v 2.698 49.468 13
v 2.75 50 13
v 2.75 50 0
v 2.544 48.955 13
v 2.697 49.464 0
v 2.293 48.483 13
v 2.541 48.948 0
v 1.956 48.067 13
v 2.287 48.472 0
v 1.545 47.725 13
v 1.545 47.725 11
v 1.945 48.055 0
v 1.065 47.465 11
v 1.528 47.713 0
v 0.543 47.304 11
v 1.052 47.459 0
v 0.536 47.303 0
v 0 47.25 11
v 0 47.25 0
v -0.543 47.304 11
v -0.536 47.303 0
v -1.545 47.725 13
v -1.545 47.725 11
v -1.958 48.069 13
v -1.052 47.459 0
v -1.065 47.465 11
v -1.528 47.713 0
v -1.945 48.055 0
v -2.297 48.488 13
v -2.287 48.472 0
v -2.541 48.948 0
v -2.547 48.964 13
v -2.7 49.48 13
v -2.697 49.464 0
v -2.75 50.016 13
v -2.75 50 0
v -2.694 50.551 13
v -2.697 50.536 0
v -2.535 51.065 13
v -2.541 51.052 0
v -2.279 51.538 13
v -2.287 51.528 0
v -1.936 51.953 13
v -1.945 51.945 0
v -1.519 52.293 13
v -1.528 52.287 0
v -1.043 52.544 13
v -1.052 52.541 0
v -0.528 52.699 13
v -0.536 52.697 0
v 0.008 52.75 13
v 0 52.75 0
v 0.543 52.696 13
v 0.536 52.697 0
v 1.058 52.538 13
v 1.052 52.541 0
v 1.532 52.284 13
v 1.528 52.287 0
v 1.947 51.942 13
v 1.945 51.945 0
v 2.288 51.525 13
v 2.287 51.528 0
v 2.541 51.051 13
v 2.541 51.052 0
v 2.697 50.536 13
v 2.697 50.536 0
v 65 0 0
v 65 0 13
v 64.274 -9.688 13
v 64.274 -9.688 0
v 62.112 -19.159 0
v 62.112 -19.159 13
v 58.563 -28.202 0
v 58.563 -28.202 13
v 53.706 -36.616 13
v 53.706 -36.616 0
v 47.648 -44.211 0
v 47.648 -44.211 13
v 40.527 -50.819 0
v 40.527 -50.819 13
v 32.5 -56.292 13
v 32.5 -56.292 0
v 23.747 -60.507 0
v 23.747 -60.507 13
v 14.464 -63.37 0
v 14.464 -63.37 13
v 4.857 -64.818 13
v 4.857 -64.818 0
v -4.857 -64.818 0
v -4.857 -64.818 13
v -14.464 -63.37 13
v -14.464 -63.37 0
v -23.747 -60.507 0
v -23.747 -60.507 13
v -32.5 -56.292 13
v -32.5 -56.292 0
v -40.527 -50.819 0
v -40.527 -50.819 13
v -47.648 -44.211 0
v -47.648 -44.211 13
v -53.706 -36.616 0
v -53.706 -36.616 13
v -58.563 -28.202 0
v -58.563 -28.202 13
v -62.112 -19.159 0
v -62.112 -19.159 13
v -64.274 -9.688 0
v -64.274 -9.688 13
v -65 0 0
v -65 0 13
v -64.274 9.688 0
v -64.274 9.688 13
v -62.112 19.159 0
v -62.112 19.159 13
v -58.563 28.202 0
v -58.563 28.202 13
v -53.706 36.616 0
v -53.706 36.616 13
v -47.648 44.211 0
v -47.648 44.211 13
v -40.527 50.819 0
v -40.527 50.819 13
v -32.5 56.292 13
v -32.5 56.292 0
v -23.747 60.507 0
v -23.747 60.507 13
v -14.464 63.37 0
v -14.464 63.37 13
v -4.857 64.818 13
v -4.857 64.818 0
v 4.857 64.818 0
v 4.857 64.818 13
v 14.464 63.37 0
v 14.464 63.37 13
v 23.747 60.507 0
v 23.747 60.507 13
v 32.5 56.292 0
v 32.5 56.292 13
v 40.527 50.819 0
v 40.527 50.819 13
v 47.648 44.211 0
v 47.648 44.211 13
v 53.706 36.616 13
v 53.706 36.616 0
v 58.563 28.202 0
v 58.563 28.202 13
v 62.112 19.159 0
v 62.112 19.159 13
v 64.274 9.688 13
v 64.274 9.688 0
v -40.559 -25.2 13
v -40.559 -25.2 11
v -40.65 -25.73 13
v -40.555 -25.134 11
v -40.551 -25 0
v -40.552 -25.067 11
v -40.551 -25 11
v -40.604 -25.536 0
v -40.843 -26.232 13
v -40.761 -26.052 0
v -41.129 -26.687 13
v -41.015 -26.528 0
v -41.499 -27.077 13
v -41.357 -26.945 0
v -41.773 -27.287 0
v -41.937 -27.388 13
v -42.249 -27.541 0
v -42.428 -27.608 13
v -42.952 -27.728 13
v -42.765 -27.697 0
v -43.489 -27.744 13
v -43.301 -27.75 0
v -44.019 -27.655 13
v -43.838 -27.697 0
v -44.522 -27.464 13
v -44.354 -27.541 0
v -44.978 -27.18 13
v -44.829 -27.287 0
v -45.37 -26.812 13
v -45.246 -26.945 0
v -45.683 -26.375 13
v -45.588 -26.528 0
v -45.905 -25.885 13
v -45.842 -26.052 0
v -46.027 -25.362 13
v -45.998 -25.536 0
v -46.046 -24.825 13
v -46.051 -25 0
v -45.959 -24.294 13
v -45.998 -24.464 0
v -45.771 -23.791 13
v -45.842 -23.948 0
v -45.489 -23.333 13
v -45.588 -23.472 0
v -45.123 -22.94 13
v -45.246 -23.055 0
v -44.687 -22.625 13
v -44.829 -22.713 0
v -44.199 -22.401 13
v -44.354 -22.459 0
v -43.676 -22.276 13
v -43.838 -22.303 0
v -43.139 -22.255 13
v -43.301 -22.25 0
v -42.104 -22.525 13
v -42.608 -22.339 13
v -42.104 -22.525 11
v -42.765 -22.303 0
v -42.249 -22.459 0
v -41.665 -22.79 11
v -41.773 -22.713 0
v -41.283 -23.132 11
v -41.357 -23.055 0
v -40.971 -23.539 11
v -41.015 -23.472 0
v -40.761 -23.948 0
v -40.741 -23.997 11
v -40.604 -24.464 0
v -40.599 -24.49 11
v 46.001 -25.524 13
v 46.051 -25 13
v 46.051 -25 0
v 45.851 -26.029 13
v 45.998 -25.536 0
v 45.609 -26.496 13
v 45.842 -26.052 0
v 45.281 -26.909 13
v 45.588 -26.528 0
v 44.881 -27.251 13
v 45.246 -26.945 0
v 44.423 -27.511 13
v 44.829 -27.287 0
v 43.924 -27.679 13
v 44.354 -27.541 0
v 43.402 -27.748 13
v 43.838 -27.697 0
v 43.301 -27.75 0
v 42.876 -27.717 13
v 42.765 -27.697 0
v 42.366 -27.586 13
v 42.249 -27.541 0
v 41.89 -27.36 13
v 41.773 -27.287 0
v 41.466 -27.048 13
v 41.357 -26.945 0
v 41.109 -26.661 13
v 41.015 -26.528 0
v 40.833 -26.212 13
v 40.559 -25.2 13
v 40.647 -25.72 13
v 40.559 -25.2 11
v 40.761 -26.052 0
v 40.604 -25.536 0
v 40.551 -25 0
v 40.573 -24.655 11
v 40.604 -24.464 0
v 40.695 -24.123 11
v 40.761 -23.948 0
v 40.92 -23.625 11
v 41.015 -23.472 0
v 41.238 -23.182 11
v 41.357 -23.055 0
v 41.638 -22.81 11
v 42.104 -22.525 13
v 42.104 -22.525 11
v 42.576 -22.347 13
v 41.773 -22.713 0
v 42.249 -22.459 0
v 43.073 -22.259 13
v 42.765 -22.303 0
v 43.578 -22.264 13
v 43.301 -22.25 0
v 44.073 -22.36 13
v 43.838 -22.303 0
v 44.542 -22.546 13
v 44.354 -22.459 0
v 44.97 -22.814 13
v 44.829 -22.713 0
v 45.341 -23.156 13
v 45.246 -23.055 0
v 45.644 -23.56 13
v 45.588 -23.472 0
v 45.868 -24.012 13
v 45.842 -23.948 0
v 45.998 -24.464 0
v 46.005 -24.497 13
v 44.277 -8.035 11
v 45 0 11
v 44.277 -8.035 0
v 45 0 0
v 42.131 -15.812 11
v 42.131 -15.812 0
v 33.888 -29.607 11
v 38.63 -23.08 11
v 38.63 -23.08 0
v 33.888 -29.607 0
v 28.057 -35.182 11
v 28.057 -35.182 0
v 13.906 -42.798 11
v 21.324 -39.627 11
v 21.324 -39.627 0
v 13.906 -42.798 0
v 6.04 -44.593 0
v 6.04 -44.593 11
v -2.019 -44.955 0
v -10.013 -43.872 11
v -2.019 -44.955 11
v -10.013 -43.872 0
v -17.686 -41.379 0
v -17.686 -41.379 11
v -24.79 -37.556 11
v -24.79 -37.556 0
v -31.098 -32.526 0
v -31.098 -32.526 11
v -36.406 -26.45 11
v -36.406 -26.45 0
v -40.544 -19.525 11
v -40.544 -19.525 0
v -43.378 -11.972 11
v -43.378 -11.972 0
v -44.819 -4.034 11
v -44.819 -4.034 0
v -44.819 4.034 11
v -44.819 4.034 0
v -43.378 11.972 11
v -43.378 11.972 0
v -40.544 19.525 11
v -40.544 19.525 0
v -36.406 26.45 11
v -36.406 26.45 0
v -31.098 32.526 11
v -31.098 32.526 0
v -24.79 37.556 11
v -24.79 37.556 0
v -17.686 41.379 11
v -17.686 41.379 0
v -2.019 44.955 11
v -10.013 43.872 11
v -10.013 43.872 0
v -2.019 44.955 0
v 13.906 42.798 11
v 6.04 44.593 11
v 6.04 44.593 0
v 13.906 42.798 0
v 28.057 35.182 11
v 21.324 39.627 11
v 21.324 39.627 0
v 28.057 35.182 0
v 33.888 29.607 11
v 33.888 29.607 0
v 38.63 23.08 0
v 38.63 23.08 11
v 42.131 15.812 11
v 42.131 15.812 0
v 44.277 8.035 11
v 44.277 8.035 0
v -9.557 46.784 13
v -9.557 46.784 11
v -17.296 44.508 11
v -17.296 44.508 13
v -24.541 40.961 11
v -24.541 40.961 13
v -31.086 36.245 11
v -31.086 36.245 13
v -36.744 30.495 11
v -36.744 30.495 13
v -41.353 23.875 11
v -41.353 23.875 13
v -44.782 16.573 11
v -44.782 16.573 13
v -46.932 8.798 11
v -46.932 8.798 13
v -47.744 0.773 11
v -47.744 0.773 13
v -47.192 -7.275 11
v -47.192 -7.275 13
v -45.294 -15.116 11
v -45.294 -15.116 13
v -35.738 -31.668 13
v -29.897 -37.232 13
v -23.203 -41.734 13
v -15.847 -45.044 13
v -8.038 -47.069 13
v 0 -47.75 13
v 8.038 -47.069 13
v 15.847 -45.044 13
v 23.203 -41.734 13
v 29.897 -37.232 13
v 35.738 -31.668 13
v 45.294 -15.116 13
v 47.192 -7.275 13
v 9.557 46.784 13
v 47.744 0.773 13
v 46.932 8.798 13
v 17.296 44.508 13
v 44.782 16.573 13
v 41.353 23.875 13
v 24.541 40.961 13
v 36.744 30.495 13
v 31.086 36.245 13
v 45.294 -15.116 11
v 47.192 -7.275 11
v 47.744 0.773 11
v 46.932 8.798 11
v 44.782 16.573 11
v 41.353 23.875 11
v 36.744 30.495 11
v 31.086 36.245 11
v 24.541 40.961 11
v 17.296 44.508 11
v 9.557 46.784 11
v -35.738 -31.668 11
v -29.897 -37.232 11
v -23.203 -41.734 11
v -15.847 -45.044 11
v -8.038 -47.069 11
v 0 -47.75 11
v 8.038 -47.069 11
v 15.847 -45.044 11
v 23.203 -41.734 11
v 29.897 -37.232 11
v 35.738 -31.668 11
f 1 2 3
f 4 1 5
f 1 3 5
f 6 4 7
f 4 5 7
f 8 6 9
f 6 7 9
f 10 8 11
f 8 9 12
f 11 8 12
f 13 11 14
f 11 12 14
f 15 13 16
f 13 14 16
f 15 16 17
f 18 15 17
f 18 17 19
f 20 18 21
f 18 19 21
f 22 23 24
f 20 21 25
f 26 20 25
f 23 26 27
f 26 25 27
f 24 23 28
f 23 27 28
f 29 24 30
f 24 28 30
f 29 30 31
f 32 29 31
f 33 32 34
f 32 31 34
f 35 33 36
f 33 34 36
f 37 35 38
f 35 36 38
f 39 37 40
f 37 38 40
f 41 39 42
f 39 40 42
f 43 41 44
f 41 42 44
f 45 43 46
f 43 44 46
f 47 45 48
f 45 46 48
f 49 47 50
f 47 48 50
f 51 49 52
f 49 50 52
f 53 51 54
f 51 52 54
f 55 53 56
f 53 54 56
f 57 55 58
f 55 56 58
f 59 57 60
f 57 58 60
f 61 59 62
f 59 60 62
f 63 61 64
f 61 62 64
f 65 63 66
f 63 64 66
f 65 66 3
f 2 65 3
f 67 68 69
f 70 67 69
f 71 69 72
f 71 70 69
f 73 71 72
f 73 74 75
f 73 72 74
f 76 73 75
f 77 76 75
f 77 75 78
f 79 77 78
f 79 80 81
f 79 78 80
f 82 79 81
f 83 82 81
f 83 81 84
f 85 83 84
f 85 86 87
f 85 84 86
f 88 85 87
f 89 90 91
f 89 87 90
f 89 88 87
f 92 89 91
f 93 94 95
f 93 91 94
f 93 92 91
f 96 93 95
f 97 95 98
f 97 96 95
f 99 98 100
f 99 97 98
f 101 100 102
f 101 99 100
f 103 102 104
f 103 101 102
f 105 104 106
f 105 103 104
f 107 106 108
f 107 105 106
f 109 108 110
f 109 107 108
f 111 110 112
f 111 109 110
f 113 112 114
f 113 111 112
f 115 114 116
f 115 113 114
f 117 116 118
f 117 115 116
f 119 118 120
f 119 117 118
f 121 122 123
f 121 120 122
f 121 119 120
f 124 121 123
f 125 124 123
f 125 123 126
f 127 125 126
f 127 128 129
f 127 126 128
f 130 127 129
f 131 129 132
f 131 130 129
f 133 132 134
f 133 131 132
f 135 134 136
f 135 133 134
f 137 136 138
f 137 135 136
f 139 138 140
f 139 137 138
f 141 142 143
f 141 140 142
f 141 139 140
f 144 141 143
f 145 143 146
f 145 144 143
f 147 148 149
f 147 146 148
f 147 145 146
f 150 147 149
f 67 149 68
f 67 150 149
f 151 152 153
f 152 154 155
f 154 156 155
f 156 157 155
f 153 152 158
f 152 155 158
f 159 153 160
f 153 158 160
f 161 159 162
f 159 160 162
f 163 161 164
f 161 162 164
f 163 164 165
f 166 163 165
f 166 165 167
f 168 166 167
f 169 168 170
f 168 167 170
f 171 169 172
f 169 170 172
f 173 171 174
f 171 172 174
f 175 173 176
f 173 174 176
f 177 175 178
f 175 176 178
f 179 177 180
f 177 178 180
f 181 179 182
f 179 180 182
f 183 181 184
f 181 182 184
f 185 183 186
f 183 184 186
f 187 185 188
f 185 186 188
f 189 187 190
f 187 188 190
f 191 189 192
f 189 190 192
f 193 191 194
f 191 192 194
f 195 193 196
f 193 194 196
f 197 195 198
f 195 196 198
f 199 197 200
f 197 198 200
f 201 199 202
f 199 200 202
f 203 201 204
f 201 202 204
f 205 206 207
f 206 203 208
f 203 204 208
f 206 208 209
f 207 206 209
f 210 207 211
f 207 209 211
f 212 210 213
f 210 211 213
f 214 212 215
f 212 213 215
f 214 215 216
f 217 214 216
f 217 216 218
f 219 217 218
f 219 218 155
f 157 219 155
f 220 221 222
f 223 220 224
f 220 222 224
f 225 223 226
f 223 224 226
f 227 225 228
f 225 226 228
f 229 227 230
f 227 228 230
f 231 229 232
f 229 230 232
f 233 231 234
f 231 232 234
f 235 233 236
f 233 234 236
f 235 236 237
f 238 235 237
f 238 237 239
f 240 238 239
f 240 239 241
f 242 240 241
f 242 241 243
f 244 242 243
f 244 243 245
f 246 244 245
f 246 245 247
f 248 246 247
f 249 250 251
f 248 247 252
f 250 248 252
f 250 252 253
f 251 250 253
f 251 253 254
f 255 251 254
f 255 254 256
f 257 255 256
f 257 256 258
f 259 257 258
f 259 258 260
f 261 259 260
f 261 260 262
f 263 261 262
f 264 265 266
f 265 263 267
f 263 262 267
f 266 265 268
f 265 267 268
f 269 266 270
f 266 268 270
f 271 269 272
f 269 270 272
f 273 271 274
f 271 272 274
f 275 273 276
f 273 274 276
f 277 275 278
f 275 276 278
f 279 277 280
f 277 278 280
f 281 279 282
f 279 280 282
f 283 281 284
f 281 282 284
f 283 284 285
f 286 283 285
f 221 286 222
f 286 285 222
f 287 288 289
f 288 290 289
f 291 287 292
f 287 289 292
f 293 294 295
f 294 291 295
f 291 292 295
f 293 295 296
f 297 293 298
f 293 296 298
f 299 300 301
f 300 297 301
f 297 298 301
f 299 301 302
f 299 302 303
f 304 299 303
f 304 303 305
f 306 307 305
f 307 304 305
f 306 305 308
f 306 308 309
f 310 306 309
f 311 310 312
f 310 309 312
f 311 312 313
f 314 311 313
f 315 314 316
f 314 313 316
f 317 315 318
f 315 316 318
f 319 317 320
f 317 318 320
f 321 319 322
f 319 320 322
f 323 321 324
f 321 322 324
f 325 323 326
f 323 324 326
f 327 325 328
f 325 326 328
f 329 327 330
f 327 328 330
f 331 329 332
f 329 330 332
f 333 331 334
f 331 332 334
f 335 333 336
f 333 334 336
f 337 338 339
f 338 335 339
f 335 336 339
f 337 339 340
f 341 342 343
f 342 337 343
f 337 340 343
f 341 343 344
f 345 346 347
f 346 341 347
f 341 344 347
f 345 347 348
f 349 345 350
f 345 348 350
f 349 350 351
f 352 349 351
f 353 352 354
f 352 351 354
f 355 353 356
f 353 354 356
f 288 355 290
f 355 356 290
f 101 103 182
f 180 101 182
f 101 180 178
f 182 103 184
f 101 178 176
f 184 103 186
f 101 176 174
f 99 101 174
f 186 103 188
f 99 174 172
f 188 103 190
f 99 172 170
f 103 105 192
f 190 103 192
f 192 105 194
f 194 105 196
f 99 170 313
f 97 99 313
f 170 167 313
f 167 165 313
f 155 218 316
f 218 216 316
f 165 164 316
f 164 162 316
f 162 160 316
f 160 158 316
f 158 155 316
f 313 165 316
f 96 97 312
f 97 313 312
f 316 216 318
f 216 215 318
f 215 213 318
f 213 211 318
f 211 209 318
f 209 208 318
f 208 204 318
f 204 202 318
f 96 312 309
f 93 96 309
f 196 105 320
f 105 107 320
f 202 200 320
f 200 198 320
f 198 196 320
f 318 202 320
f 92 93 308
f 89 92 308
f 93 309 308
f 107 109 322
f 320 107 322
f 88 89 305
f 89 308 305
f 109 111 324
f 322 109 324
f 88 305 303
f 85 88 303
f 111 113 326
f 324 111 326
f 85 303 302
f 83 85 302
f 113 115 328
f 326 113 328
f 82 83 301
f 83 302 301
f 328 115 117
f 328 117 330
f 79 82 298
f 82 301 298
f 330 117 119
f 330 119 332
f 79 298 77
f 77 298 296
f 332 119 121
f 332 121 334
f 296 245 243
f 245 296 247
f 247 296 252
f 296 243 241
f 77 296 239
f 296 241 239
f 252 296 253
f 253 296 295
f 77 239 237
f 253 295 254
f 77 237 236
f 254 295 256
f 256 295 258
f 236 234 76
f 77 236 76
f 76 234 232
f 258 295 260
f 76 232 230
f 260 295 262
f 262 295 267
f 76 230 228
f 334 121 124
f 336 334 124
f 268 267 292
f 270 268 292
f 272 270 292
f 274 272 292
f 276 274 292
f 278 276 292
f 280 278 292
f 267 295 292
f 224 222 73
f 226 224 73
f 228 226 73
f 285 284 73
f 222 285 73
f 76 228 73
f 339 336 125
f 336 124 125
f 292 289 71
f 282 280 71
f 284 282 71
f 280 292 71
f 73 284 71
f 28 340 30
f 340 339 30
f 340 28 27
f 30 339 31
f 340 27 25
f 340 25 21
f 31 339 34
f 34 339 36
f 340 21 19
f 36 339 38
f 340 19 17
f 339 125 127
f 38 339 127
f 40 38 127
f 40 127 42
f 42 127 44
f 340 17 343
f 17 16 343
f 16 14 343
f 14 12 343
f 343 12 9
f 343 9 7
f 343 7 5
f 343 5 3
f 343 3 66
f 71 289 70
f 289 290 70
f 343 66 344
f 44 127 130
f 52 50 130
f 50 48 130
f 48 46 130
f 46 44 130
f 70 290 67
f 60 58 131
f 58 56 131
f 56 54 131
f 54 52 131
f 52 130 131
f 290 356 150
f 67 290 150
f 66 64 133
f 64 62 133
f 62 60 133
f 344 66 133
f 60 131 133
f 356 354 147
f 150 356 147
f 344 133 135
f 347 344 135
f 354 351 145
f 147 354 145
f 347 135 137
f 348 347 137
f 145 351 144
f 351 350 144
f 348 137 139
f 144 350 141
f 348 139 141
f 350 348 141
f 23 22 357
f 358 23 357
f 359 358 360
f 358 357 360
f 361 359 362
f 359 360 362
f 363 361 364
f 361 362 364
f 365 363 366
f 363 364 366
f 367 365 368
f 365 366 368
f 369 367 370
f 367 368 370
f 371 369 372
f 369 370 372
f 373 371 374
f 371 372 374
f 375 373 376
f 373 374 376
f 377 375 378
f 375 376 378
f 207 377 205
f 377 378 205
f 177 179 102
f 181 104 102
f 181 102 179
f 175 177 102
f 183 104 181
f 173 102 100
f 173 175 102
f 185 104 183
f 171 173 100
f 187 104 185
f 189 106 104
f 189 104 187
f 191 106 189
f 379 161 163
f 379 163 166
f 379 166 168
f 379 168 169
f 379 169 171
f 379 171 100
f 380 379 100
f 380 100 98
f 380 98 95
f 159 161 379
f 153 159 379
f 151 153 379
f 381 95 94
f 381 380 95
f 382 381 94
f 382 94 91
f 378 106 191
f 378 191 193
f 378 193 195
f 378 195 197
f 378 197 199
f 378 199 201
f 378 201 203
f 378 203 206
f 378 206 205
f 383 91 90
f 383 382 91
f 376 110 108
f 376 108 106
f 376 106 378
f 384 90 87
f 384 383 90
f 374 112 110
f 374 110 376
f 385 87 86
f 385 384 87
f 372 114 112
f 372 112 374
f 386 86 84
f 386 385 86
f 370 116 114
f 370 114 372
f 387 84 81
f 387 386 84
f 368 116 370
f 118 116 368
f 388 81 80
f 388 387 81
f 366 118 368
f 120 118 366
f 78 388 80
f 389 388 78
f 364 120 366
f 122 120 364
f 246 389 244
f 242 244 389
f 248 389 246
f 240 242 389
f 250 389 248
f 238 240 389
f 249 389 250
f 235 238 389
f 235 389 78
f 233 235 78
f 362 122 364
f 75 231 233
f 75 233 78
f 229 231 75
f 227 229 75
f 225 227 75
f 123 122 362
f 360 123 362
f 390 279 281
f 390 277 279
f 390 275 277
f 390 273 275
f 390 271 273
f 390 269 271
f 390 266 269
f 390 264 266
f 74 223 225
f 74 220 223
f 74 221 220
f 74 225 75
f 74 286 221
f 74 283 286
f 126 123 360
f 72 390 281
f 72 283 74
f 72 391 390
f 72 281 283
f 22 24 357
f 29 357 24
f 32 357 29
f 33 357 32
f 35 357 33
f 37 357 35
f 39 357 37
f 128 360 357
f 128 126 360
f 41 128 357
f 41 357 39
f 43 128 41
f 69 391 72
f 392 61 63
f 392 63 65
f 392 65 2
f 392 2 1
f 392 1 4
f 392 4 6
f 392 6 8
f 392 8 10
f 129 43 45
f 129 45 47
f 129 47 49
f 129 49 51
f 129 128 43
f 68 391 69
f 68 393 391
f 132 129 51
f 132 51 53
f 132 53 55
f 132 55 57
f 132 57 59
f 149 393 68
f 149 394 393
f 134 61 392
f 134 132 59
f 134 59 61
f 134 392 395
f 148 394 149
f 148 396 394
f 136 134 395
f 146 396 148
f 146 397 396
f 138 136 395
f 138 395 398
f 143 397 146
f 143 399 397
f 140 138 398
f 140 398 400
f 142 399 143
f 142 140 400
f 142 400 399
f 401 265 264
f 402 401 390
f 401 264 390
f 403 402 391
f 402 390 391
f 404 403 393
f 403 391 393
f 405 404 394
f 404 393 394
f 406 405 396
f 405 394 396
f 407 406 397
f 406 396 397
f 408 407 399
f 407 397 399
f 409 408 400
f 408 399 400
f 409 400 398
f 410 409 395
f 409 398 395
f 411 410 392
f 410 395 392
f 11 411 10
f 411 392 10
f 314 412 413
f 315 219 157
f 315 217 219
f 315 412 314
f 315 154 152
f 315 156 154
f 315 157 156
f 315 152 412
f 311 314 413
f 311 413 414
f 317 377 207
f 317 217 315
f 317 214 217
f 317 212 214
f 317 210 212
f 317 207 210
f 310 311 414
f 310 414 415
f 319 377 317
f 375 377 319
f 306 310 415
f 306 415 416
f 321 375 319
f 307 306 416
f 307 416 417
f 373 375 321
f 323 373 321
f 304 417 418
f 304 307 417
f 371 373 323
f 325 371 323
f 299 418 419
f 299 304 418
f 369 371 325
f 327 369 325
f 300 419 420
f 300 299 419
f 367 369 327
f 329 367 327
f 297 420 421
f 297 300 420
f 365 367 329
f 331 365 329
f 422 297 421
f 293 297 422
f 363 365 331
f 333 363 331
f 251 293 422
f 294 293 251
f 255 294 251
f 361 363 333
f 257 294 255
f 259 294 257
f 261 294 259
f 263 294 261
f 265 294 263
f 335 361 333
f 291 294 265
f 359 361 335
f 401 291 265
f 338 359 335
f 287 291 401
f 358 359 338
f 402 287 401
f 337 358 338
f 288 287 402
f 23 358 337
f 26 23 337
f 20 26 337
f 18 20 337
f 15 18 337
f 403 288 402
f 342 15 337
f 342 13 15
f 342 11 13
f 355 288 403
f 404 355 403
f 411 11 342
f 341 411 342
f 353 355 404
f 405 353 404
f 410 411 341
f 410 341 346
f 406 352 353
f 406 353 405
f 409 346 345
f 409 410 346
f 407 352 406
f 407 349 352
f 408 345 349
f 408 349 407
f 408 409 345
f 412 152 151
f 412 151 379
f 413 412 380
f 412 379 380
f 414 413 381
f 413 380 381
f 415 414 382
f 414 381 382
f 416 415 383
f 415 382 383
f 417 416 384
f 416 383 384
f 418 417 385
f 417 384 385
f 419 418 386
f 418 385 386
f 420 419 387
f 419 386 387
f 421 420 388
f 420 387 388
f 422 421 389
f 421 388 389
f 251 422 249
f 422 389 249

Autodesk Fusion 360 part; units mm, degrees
sketch "Base" plane through (0, 0, 0) normal (0, 0, 1) x (1, 0, 0)
  circle A0 centre (0, 0) radius 45
  circle A1 centre (0, 0) radius 47.75
  circle A2 centre (0, 0) radius 65
  line L0 (0, 0) -> (0, 50) construction
  circle A3 centre (0, 50) radius 2.75
  circle A4 centre (-43.3013, -25) radius 2.75
  circle A5 centre (43.3013, -25) radius 2.75
  dimension "d6" = 90
  dimension "d7" = 95.5
  dimension "d8" = 130
  dimension "d12" = 50
  dimension "d13" = 5.5
  dimension "d15" = 360
extrude "Extrude1" add sketch "Base" along normal blind 13 contours A0 | A1 A3 A4 A5 | A2
extrude "Extrude2" add sketch "Base" along normal up to surface (11 mm away) from surface at 2 contours A1 A3 A4 A5 | A1 A3 | A1 A5 | A1 A4 picked at (0, 47.5815) picked at (41.2068, -23.7907) picked at (-41.224, -23.7621)
extrude "Extrude3" add sketch "Base" along normal up to surface (5 mm away) from surface at 8 contours A1 A3 | A1 A3 | A1 A5 | A1 A5 | A1 A4 | A1 A4
extrude "Extrude4" cut sketch "Base" along normal up to surface (13 mm away) contours A1 A3 | A1 A5 | A1 A4 picked at (-0.0423, 49.4138) picked at (42.7651, -24.7549) picked at (-42.7945, -24.7074)
extrude "Extrude5" cut sketch "Base" along normal up to surface (13 mm away) contours A0
extrude "Extrude6" cut sketch "Base" along normal up to surface (13 mm away) contours A1 A3 | A1 A3 | A1 A5 | A1 A5 | A1 A4 | A1 A4
extrude "Extrude7" cut sketch "Base" against normal blind 2 from surface at 13 contours A1 A3 A4 A5
equation "adapterInnerHoleDiameter = 89 mm" comment "Valkoisen välipalikan pienempi hole"
equation "adapterFlangeDepth = 2 mm" comment "Valkoisen välipalikan huulloksen syvyys"
equation "adapterFlangeDiameter = 94.5 mm" comment "Valkoisen välipalikan huulloksen halkaisija"
equation "plafondBaseDiameter = 130 mm" comment "Plafondilampun pohjan halkaisija"
equation "plafondBaseScrewDistance = 87 mm" comment "Plafondin kiinnitysruuvien etäisyys"
equation "d6 = adapterInnerHoleDiameter + shrinkageTolerance"
equation "d7 = adapterFlangeDiameter + shrinkageTolerance"
equation "d8 = plafondBaseDiameter"
equation "adapterInnerHoleDepth = 11 mm" comment "Valkoisen välipalikan syvyys"
equation "heatInsertDiameter = 5.5 mm" comment "M4 brass heat insert"
equation "heatInsertLength = 8 mm" comment "M4 brass heat insert"
equation "d12 = adapterFlangeDiameter / 2 + heatInsertDiameter / 2"
equation "d13 = heatInsertDiameter"
equation "d16 = adapterFlangeDepth + adapterInnerHoleDepth"
equation "d18 = adapterFlangeDepth"
equation "d21 = heatInsertLength"
equation "shrinkageTolerance = 1 mm" comment "Account printing material shrinkage"
equation "d32 = -adapterFlangeDepth"
